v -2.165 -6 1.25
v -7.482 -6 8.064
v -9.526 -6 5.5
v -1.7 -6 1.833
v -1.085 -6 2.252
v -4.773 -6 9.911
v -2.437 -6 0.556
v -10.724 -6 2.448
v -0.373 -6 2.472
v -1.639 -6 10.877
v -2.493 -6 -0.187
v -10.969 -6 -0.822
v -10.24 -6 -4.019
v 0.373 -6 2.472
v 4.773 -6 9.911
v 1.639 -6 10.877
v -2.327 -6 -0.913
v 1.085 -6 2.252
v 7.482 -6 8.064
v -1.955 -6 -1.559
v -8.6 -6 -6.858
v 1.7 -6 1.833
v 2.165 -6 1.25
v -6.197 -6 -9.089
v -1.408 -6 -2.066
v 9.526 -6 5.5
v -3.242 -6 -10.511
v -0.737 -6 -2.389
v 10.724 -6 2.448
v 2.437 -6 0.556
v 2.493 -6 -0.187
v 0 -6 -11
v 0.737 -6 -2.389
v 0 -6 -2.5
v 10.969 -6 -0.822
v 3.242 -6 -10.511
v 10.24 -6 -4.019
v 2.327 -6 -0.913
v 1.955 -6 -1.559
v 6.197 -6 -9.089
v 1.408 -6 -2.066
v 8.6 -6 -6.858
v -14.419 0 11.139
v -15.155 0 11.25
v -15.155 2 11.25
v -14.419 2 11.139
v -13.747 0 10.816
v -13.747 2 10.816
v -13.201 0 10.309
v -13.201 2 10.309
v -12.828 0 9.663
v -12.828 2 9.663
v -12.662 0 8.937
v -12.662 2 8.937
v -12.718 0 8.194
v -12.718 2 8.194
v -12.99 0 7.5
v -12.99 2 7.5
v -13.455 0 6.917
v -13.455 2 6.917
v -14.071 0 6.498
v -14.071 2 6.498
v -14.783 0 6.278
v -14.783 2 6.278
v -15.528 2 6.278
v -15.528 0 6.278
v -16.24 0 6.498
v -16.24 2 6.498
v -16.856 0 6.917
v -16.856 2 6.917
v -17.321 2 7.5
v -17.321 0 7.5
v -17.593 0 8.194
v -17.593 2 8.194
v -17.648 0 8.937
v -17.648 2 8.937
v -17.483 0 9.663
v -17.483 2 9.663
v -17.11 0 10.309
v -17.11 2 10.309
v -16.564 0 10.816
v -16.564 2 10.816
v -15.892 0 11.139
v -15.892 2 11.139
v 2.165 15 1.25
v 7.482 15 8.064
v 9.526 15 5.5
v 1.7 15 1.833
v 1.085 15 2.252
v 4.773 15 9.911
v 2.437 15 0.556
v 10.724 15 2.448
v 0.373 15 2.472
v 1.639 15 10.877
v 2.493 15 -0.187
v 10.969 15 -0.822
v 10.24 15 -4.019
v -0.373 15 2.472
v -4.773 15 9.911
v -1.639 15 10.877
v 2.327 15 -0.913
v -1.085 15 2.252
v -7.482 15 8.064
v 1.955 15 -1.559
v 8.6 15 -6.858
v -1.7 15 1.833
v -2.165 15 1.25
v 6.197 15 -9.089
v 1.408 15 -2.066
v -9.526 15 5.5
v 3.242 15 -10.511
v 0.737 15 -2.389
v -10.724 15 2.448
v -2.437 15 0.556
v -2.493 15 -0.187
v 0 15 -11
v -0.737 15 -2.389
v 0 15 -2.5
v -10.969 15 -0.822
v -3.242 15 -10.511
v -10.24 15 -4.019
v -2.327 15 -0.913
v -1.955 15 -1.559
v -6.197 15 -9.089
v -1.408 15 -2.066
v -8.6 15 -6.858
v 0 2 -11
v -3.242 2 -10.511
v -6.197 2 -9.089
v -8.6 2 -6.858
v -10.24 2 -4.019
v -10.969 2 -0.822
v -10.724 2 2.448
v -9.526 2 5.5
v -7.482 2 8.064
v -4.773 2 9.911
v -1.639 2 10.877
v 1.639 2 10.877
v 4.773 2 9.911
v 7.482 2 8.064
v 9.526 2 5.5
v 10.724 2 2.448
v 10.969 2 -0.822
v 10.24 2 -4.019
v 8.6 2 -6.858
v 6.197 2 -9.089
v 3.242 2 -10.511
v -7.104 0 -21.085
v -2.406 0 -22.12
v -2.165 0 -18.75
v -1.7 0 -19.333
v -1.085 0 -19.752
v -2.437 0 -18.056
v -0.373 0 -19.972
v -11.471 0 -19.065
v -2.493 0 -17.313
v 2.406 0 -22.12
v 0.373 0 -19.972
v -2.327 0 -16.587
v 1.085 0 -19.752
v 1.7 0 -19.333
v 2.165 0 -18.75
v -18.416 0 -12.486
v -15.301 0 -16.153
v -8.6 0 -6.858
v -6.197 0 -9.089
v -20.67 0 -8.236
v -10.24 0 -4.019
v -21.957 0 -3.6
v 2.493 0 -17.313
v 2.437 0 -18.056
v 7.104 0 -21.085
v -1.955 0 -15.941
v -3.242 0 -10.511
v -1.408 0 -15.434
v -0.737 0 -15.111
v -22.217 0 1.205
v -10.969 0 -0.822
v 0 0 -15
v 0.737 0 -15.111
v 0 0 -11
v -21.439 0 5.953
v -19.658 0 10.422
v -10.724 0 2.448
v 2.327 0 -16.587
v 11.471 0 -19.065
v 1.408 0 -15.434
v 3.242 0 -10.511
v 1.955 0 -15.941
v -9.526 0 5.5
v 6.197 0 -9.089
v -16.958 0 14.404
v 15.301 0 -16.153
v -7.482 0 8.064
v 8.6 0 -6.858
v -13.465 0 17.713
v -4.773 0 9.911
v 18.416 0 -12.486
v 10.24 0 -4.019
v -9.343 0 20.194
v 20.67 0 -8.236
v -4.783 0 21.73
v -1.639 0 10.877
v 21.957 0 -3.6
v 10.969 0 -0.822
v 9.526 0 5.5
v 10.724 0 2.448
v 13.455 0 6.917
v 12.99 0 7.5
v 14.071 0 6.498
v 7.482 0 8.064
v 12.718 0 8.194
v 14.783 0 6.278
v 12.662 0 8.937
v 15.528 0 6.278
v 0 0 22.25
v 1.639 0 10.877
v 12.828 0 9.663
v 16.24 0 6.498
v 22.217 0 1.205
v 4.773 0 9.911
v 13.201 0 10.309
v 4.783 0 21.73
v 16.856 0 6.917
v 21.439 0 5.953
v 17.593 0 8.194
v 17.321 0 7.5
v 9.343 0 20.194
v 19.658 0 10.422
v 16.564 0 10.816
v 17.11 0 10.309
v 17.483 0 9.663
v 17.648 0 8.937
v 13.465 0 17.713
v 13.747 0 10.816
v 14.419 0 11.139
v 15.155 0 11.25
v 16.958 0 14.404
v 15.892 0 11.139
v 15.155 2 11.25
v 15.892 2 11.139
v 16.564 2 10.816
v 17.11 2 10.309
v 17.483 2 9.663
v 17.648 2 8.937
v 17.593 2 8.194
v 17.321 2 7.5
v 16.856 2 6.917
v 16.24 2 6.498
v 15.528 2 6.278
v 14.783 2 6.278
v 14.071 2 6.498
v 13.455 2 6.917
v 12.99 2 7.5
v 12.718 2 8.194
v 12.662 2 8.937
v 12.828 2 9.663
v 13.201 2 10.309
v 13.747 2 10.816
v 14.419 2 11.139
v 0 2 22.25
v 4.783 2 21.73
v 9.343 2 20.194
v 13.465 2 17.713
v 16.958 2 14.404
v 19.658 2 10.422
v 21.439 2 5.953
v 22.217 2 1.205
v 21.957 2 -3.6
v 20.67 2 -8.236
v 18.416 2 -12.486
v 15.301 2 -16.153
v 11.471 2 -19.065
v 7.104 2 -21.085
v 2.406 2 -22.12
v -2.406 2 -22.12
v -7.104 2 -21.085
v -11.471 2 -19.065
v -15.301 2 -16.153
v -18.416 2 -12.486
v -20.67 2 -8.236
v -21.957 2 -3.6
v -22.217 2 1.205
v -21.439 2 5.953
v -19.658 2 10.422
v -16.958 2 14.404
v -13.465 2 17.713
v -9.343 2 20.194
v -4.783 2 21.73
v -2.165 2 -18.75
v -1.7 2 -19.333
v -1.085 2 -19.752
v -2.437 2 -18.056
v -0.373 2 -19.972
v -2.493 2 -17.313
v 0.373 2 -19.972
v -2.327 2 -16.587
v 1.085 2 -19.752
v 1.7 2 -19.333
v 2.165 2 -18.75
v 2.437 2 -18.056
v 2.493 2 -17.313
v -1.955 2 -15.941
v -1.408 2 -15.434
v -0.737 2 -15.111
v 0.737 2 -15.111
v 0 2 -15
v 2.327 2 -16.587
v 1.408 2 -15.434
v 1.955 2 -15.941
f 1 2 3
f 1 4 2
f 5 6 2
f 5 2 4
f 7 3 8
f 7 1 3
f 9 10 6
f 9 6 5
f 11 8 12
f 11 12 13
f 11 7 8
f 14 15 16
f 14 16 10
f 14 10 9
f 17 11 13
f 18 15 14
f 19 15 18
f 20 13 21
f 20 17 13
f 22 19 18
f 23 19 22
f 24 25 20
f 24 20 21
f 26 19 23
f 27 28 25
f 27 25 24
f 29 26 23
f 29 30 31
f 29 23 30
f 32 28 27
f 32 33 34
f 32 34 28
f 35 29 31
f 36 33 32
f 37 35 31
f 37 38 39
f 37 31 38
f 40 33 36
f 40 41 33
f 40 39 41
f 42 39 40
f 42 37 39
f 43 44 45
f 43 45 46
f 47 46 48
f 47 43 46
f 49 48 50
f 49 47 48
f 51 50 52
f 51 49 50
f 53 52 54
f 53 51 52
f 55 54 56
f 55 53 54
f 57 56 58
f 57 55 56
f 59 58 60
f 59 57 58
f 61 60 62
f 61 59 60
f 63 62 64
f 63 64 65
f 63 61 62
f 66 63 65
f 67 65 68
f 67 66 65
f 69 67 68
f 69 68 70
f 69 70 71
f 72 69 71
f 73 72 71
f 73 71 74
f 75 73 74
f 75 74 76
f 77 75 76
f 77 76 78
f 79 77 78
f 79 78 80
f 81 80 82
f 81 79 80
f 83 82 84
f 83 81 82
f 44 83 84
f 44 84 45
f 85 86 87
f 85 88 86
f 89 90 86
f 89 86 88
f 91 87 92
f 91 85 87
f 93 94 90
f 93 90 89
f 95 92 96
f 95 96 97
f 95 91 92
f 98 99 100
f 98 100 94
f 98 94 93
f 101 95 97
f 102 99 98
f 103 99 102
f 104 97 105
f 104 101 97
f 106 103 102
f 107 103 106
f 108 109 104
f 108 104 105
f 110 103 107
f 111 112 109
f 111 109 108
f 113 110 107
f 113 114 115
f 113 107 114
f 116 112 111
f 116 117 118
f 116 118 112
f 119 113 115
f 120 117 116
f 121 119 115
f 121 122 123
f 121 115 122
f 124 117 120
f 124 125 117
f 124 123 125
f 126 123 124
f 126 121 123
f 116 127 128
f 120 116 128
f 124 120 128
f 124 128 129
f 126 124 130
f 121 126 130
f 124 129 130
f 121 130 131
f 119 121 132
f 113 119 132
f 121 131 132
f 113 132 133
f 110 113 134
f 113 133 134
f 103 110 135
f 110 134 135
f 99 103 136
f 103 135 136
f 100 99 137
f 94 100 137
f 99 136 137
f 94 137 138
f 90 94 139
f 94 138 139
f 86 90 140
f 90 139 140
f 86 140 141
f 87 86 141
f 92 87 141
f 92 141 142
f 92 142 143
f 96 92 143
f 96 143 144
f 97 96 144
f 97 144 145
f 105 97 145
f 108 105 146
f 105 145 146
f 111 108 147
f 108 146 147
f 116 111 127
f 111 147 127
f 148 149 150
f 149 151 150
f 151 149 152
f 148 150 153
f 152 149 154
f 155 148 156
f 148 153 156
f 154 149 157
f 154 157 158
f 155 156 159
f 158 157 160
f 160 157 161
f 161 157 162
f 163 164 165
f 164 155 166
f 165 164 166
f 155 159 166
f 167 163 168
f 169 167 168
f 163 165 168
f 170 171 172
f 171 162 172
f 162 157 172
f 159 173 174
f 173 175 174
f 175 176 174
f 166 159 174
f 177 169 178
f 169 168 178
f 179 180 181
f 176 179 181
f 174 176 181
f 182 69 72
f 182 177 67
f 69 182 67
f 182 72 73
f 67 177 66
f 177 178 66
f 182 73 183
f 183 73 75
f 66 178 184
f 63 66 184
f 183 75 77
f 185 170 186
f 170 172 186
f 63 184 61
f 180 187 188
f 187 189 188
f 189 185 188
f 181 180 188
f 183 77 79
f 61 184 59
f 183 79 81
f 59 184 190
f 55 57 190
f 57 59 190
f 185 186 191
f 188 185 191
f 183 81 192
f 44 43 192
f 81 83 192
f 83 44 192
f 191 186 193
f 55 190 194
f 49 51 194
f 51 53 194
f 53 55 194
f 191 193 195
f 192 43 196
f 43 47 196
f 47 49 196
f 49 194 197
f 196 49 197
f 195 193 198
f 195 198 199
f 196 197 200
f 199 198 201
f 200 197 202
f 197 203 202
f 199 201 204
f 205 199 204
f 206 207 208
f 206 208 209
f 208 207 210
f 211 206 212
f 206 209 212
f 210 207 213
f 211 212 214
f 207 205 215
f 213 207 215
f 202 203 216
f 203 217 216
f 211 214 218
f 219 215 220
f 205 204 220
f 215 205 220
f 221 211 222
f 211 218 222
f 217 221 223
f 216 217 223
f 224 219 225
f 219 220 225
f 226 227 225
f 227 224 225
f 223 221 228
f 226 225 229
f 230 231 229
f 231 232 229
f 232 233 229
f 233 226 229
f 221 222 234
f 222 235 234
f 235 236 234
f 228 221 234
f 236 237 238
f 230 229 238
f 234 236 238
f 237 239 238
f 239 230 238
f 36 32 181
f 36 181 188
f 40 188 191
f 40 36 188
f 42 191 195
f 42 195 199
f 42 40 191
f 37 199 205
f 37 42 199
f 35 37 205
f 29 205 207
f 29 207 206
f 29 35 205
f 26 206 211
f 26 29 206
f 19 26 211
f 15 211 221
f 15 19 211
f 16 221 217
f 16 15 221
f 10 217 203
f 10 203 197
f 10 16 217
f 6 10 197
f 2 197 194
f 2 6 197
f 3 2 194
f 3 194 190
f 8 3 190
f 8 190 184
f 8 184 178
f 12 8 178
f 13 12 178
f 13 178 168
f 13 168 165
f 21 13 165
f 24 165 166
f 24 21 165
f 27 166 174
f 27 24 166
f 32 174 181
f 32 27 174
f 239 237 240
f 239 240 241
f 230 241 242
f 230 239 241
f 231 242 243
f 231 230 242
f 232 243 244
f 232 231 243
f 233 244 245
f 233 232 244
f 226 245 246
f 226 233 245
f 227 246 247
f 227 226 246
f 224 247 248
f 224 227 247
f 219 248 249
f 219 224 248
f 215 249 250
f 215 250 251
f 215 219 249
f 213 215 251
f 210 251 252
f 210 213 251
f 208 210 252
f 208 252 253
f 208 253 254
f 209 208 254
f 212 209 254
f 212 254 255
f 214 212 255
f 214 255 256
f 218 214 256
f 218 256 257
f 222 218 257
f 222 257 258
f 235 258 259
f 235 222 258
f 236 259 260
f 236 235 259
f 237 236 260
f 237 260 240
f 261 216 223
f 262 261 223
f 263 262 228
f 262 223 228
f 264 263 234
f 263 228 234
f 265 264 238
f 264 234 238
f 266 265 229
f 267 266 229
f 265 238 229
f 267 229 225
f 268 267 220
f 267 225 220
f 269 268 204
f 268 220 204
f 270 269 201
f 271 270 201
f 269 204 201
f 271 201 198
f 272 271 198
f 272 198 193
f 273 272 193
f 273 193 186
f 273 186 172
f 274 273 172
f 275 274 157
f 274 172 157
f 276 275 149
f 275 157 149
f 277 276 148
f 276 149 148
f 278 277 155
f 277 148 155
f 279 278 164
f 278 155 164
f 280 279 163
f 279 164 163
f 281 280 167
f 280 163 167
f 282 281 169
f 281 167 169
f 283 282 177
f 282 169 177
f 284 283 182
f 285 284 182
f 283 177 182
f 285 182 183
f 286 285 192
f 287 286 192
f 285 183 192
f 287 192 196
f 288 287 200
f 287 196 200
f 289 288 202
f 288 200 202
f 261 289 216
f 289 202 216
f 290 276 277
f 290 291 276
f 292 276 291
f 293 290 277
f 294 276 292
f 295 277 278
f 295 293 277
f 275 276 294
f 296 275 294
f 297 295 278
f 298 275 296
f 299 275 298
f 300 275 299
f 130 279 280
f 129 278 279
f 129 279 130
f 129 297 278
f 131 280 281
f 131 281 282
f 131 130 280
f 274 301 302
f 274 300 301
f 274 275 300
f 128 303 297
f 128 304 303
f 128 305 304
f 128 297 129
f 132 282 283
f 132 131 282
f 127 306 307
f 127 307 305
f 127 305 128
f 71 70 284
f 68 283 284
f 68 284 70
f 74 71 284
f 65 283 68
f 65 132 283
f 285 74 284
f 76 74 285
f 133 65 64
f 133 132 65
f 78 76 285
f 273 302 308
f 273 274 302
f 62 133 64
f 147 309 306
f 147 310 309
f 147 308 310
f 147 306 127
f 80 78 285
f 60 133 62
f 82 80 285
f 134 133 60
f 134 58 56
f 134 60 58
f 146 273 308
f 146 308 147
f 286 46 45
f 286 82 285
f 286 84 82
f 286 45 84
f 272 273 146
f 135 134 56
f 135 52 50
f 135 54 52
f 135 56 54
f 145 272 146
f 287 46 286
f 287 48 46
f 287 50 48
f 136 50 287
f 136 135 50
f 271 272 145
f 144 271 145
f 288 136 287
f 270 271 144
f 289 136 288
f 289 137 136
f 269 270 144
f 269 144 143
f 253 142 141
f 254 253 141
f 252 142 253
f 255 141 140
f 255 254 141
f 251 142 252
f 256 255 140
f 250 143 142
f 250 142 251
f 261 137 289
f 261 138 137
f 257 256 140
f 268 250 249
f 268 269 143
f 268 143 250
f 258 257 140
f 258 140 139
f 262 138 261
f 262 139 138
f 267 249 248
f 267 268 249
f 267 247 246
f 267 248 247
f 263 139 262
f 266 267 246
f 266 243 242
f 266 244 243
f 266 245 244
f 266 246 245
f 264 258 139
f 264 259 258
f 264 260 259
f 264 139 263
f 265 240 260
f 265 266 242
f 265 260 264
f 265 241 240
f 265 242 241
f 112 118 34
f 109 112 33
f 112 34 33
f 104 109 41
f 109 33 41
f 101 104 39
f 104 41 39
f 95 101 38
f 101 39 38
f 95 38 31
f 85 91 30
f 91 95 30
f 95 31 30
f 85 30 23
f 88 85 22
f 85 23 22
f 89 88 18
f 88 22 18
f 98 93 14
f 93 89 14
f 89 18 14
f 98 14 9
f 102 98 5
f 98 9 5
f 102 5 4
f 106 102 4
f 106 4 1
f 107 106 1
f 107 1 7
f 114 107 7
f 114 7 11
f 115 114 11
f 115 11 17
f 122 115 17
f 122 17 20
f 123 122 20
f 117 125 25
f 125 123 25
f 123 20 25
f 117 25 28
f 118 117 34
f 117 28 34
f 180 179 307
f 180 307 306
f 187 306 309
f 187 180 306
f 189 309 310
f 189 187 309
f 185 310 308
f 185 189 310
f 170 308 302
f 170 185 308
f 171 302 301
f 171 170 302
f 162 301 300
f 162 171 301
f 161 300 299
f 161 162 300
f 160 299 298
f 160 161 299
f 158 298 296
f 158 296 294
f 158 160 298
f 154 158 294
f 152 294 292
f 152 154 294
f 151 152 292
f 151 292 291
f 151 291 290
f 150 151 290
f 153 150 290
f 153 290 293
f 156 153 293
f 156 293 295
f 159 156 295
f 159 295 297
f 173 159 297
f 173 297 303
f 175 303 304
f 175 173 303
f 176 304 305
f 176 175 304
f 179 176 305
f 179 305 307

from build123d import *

# Parameters (mm, degrees)
SKETCH_1_R          = 22.25
SKETCH_1_R_2        = 2.5
EXTRUDE_1_DEPTH     = 2
SKETCH_3_R          = 11
SKETCH_3_R_2        = 2.5
EXTRUDE_3_DEPTH     = 13
EXTRUDE_START       = 6
SKETCH_4_R          = 11
EXTRUDE_4_DEPTH     = 6
SKETCH_6_R          = 2.5
CUT_EXTRUDE_2_DEPTH = 9


with BuildPart() as part:
    # 草图1 → 凸台-拉伸1 (new body)
    with BuildSketch(Plane(origin=(0, 0, 0), x_dir=(1, 0, 0), z_dir=(0, 1, 0))):
        with Locations(Location((0, 0, 0), (0, 0, 270))):
            Circle(SKETCH_1_R)
        with Locations(Location((0, 17.5, 0), (0, 0, 270))):
            Circle(SKETCH_1_R_2, mode=Mode.SUBTRACT)
        with Locations(Location((-15.155444566, -8.75, 0), (0, 0, 270))):
            Circle(SKETCH_1_R_2, mode=Mode.SUBTRACT)
        with Locations(Location((15.155444566, -8.75, 0), (0, 0, 270))):
            Circle(SKETCH_1_R_2, mode=Mode.SUBTRACT)
    extrude(amount=EXTRUDE_1_DEPTH)

    # 草图3 → 凸台-拉伸3 (add)
    with BuildSketch(Plane(origin=(0, 2, 0), x_dir=(1, 0, 0), z_dir=(0, 1, 0))):
        with Locations(Location((0, 0, 0), (0, 0, 90))):
            Circle(SKETCH_3_R)
        with Locations(Location((0, 0, 0), (0, 0, 90))):
            Circle(SKETCH_3_R_2, mode=Mode.SUBTRACT)
    extrude(amount=EXTRUDE_3_DEPTH)

    # 草图4 → 凸台-拉伸4 (add)
    with BuildSketch(Plane.XZ.offset(EXTRUDE_START)):
        with Locations(Location((0, 0, 0), (0, 0, 270))):
            Circle(SKETCH_4_R)
    extrude(amount=-EXTRUDE_4_DEPTH)

    # 草图6 → 切除-拉伸2 (cut)
    with BuildSketch(Plane.XZ.offset(6)):
        with Locations(Location((0, 0, 0), (0, 0, 270))):
            Circle(SKETCH_6_R)
    extrude(amount=-CUT_EXTRUDE_2_DEPTH, mode=Mode.SUBTRACT)


solid = part.part
